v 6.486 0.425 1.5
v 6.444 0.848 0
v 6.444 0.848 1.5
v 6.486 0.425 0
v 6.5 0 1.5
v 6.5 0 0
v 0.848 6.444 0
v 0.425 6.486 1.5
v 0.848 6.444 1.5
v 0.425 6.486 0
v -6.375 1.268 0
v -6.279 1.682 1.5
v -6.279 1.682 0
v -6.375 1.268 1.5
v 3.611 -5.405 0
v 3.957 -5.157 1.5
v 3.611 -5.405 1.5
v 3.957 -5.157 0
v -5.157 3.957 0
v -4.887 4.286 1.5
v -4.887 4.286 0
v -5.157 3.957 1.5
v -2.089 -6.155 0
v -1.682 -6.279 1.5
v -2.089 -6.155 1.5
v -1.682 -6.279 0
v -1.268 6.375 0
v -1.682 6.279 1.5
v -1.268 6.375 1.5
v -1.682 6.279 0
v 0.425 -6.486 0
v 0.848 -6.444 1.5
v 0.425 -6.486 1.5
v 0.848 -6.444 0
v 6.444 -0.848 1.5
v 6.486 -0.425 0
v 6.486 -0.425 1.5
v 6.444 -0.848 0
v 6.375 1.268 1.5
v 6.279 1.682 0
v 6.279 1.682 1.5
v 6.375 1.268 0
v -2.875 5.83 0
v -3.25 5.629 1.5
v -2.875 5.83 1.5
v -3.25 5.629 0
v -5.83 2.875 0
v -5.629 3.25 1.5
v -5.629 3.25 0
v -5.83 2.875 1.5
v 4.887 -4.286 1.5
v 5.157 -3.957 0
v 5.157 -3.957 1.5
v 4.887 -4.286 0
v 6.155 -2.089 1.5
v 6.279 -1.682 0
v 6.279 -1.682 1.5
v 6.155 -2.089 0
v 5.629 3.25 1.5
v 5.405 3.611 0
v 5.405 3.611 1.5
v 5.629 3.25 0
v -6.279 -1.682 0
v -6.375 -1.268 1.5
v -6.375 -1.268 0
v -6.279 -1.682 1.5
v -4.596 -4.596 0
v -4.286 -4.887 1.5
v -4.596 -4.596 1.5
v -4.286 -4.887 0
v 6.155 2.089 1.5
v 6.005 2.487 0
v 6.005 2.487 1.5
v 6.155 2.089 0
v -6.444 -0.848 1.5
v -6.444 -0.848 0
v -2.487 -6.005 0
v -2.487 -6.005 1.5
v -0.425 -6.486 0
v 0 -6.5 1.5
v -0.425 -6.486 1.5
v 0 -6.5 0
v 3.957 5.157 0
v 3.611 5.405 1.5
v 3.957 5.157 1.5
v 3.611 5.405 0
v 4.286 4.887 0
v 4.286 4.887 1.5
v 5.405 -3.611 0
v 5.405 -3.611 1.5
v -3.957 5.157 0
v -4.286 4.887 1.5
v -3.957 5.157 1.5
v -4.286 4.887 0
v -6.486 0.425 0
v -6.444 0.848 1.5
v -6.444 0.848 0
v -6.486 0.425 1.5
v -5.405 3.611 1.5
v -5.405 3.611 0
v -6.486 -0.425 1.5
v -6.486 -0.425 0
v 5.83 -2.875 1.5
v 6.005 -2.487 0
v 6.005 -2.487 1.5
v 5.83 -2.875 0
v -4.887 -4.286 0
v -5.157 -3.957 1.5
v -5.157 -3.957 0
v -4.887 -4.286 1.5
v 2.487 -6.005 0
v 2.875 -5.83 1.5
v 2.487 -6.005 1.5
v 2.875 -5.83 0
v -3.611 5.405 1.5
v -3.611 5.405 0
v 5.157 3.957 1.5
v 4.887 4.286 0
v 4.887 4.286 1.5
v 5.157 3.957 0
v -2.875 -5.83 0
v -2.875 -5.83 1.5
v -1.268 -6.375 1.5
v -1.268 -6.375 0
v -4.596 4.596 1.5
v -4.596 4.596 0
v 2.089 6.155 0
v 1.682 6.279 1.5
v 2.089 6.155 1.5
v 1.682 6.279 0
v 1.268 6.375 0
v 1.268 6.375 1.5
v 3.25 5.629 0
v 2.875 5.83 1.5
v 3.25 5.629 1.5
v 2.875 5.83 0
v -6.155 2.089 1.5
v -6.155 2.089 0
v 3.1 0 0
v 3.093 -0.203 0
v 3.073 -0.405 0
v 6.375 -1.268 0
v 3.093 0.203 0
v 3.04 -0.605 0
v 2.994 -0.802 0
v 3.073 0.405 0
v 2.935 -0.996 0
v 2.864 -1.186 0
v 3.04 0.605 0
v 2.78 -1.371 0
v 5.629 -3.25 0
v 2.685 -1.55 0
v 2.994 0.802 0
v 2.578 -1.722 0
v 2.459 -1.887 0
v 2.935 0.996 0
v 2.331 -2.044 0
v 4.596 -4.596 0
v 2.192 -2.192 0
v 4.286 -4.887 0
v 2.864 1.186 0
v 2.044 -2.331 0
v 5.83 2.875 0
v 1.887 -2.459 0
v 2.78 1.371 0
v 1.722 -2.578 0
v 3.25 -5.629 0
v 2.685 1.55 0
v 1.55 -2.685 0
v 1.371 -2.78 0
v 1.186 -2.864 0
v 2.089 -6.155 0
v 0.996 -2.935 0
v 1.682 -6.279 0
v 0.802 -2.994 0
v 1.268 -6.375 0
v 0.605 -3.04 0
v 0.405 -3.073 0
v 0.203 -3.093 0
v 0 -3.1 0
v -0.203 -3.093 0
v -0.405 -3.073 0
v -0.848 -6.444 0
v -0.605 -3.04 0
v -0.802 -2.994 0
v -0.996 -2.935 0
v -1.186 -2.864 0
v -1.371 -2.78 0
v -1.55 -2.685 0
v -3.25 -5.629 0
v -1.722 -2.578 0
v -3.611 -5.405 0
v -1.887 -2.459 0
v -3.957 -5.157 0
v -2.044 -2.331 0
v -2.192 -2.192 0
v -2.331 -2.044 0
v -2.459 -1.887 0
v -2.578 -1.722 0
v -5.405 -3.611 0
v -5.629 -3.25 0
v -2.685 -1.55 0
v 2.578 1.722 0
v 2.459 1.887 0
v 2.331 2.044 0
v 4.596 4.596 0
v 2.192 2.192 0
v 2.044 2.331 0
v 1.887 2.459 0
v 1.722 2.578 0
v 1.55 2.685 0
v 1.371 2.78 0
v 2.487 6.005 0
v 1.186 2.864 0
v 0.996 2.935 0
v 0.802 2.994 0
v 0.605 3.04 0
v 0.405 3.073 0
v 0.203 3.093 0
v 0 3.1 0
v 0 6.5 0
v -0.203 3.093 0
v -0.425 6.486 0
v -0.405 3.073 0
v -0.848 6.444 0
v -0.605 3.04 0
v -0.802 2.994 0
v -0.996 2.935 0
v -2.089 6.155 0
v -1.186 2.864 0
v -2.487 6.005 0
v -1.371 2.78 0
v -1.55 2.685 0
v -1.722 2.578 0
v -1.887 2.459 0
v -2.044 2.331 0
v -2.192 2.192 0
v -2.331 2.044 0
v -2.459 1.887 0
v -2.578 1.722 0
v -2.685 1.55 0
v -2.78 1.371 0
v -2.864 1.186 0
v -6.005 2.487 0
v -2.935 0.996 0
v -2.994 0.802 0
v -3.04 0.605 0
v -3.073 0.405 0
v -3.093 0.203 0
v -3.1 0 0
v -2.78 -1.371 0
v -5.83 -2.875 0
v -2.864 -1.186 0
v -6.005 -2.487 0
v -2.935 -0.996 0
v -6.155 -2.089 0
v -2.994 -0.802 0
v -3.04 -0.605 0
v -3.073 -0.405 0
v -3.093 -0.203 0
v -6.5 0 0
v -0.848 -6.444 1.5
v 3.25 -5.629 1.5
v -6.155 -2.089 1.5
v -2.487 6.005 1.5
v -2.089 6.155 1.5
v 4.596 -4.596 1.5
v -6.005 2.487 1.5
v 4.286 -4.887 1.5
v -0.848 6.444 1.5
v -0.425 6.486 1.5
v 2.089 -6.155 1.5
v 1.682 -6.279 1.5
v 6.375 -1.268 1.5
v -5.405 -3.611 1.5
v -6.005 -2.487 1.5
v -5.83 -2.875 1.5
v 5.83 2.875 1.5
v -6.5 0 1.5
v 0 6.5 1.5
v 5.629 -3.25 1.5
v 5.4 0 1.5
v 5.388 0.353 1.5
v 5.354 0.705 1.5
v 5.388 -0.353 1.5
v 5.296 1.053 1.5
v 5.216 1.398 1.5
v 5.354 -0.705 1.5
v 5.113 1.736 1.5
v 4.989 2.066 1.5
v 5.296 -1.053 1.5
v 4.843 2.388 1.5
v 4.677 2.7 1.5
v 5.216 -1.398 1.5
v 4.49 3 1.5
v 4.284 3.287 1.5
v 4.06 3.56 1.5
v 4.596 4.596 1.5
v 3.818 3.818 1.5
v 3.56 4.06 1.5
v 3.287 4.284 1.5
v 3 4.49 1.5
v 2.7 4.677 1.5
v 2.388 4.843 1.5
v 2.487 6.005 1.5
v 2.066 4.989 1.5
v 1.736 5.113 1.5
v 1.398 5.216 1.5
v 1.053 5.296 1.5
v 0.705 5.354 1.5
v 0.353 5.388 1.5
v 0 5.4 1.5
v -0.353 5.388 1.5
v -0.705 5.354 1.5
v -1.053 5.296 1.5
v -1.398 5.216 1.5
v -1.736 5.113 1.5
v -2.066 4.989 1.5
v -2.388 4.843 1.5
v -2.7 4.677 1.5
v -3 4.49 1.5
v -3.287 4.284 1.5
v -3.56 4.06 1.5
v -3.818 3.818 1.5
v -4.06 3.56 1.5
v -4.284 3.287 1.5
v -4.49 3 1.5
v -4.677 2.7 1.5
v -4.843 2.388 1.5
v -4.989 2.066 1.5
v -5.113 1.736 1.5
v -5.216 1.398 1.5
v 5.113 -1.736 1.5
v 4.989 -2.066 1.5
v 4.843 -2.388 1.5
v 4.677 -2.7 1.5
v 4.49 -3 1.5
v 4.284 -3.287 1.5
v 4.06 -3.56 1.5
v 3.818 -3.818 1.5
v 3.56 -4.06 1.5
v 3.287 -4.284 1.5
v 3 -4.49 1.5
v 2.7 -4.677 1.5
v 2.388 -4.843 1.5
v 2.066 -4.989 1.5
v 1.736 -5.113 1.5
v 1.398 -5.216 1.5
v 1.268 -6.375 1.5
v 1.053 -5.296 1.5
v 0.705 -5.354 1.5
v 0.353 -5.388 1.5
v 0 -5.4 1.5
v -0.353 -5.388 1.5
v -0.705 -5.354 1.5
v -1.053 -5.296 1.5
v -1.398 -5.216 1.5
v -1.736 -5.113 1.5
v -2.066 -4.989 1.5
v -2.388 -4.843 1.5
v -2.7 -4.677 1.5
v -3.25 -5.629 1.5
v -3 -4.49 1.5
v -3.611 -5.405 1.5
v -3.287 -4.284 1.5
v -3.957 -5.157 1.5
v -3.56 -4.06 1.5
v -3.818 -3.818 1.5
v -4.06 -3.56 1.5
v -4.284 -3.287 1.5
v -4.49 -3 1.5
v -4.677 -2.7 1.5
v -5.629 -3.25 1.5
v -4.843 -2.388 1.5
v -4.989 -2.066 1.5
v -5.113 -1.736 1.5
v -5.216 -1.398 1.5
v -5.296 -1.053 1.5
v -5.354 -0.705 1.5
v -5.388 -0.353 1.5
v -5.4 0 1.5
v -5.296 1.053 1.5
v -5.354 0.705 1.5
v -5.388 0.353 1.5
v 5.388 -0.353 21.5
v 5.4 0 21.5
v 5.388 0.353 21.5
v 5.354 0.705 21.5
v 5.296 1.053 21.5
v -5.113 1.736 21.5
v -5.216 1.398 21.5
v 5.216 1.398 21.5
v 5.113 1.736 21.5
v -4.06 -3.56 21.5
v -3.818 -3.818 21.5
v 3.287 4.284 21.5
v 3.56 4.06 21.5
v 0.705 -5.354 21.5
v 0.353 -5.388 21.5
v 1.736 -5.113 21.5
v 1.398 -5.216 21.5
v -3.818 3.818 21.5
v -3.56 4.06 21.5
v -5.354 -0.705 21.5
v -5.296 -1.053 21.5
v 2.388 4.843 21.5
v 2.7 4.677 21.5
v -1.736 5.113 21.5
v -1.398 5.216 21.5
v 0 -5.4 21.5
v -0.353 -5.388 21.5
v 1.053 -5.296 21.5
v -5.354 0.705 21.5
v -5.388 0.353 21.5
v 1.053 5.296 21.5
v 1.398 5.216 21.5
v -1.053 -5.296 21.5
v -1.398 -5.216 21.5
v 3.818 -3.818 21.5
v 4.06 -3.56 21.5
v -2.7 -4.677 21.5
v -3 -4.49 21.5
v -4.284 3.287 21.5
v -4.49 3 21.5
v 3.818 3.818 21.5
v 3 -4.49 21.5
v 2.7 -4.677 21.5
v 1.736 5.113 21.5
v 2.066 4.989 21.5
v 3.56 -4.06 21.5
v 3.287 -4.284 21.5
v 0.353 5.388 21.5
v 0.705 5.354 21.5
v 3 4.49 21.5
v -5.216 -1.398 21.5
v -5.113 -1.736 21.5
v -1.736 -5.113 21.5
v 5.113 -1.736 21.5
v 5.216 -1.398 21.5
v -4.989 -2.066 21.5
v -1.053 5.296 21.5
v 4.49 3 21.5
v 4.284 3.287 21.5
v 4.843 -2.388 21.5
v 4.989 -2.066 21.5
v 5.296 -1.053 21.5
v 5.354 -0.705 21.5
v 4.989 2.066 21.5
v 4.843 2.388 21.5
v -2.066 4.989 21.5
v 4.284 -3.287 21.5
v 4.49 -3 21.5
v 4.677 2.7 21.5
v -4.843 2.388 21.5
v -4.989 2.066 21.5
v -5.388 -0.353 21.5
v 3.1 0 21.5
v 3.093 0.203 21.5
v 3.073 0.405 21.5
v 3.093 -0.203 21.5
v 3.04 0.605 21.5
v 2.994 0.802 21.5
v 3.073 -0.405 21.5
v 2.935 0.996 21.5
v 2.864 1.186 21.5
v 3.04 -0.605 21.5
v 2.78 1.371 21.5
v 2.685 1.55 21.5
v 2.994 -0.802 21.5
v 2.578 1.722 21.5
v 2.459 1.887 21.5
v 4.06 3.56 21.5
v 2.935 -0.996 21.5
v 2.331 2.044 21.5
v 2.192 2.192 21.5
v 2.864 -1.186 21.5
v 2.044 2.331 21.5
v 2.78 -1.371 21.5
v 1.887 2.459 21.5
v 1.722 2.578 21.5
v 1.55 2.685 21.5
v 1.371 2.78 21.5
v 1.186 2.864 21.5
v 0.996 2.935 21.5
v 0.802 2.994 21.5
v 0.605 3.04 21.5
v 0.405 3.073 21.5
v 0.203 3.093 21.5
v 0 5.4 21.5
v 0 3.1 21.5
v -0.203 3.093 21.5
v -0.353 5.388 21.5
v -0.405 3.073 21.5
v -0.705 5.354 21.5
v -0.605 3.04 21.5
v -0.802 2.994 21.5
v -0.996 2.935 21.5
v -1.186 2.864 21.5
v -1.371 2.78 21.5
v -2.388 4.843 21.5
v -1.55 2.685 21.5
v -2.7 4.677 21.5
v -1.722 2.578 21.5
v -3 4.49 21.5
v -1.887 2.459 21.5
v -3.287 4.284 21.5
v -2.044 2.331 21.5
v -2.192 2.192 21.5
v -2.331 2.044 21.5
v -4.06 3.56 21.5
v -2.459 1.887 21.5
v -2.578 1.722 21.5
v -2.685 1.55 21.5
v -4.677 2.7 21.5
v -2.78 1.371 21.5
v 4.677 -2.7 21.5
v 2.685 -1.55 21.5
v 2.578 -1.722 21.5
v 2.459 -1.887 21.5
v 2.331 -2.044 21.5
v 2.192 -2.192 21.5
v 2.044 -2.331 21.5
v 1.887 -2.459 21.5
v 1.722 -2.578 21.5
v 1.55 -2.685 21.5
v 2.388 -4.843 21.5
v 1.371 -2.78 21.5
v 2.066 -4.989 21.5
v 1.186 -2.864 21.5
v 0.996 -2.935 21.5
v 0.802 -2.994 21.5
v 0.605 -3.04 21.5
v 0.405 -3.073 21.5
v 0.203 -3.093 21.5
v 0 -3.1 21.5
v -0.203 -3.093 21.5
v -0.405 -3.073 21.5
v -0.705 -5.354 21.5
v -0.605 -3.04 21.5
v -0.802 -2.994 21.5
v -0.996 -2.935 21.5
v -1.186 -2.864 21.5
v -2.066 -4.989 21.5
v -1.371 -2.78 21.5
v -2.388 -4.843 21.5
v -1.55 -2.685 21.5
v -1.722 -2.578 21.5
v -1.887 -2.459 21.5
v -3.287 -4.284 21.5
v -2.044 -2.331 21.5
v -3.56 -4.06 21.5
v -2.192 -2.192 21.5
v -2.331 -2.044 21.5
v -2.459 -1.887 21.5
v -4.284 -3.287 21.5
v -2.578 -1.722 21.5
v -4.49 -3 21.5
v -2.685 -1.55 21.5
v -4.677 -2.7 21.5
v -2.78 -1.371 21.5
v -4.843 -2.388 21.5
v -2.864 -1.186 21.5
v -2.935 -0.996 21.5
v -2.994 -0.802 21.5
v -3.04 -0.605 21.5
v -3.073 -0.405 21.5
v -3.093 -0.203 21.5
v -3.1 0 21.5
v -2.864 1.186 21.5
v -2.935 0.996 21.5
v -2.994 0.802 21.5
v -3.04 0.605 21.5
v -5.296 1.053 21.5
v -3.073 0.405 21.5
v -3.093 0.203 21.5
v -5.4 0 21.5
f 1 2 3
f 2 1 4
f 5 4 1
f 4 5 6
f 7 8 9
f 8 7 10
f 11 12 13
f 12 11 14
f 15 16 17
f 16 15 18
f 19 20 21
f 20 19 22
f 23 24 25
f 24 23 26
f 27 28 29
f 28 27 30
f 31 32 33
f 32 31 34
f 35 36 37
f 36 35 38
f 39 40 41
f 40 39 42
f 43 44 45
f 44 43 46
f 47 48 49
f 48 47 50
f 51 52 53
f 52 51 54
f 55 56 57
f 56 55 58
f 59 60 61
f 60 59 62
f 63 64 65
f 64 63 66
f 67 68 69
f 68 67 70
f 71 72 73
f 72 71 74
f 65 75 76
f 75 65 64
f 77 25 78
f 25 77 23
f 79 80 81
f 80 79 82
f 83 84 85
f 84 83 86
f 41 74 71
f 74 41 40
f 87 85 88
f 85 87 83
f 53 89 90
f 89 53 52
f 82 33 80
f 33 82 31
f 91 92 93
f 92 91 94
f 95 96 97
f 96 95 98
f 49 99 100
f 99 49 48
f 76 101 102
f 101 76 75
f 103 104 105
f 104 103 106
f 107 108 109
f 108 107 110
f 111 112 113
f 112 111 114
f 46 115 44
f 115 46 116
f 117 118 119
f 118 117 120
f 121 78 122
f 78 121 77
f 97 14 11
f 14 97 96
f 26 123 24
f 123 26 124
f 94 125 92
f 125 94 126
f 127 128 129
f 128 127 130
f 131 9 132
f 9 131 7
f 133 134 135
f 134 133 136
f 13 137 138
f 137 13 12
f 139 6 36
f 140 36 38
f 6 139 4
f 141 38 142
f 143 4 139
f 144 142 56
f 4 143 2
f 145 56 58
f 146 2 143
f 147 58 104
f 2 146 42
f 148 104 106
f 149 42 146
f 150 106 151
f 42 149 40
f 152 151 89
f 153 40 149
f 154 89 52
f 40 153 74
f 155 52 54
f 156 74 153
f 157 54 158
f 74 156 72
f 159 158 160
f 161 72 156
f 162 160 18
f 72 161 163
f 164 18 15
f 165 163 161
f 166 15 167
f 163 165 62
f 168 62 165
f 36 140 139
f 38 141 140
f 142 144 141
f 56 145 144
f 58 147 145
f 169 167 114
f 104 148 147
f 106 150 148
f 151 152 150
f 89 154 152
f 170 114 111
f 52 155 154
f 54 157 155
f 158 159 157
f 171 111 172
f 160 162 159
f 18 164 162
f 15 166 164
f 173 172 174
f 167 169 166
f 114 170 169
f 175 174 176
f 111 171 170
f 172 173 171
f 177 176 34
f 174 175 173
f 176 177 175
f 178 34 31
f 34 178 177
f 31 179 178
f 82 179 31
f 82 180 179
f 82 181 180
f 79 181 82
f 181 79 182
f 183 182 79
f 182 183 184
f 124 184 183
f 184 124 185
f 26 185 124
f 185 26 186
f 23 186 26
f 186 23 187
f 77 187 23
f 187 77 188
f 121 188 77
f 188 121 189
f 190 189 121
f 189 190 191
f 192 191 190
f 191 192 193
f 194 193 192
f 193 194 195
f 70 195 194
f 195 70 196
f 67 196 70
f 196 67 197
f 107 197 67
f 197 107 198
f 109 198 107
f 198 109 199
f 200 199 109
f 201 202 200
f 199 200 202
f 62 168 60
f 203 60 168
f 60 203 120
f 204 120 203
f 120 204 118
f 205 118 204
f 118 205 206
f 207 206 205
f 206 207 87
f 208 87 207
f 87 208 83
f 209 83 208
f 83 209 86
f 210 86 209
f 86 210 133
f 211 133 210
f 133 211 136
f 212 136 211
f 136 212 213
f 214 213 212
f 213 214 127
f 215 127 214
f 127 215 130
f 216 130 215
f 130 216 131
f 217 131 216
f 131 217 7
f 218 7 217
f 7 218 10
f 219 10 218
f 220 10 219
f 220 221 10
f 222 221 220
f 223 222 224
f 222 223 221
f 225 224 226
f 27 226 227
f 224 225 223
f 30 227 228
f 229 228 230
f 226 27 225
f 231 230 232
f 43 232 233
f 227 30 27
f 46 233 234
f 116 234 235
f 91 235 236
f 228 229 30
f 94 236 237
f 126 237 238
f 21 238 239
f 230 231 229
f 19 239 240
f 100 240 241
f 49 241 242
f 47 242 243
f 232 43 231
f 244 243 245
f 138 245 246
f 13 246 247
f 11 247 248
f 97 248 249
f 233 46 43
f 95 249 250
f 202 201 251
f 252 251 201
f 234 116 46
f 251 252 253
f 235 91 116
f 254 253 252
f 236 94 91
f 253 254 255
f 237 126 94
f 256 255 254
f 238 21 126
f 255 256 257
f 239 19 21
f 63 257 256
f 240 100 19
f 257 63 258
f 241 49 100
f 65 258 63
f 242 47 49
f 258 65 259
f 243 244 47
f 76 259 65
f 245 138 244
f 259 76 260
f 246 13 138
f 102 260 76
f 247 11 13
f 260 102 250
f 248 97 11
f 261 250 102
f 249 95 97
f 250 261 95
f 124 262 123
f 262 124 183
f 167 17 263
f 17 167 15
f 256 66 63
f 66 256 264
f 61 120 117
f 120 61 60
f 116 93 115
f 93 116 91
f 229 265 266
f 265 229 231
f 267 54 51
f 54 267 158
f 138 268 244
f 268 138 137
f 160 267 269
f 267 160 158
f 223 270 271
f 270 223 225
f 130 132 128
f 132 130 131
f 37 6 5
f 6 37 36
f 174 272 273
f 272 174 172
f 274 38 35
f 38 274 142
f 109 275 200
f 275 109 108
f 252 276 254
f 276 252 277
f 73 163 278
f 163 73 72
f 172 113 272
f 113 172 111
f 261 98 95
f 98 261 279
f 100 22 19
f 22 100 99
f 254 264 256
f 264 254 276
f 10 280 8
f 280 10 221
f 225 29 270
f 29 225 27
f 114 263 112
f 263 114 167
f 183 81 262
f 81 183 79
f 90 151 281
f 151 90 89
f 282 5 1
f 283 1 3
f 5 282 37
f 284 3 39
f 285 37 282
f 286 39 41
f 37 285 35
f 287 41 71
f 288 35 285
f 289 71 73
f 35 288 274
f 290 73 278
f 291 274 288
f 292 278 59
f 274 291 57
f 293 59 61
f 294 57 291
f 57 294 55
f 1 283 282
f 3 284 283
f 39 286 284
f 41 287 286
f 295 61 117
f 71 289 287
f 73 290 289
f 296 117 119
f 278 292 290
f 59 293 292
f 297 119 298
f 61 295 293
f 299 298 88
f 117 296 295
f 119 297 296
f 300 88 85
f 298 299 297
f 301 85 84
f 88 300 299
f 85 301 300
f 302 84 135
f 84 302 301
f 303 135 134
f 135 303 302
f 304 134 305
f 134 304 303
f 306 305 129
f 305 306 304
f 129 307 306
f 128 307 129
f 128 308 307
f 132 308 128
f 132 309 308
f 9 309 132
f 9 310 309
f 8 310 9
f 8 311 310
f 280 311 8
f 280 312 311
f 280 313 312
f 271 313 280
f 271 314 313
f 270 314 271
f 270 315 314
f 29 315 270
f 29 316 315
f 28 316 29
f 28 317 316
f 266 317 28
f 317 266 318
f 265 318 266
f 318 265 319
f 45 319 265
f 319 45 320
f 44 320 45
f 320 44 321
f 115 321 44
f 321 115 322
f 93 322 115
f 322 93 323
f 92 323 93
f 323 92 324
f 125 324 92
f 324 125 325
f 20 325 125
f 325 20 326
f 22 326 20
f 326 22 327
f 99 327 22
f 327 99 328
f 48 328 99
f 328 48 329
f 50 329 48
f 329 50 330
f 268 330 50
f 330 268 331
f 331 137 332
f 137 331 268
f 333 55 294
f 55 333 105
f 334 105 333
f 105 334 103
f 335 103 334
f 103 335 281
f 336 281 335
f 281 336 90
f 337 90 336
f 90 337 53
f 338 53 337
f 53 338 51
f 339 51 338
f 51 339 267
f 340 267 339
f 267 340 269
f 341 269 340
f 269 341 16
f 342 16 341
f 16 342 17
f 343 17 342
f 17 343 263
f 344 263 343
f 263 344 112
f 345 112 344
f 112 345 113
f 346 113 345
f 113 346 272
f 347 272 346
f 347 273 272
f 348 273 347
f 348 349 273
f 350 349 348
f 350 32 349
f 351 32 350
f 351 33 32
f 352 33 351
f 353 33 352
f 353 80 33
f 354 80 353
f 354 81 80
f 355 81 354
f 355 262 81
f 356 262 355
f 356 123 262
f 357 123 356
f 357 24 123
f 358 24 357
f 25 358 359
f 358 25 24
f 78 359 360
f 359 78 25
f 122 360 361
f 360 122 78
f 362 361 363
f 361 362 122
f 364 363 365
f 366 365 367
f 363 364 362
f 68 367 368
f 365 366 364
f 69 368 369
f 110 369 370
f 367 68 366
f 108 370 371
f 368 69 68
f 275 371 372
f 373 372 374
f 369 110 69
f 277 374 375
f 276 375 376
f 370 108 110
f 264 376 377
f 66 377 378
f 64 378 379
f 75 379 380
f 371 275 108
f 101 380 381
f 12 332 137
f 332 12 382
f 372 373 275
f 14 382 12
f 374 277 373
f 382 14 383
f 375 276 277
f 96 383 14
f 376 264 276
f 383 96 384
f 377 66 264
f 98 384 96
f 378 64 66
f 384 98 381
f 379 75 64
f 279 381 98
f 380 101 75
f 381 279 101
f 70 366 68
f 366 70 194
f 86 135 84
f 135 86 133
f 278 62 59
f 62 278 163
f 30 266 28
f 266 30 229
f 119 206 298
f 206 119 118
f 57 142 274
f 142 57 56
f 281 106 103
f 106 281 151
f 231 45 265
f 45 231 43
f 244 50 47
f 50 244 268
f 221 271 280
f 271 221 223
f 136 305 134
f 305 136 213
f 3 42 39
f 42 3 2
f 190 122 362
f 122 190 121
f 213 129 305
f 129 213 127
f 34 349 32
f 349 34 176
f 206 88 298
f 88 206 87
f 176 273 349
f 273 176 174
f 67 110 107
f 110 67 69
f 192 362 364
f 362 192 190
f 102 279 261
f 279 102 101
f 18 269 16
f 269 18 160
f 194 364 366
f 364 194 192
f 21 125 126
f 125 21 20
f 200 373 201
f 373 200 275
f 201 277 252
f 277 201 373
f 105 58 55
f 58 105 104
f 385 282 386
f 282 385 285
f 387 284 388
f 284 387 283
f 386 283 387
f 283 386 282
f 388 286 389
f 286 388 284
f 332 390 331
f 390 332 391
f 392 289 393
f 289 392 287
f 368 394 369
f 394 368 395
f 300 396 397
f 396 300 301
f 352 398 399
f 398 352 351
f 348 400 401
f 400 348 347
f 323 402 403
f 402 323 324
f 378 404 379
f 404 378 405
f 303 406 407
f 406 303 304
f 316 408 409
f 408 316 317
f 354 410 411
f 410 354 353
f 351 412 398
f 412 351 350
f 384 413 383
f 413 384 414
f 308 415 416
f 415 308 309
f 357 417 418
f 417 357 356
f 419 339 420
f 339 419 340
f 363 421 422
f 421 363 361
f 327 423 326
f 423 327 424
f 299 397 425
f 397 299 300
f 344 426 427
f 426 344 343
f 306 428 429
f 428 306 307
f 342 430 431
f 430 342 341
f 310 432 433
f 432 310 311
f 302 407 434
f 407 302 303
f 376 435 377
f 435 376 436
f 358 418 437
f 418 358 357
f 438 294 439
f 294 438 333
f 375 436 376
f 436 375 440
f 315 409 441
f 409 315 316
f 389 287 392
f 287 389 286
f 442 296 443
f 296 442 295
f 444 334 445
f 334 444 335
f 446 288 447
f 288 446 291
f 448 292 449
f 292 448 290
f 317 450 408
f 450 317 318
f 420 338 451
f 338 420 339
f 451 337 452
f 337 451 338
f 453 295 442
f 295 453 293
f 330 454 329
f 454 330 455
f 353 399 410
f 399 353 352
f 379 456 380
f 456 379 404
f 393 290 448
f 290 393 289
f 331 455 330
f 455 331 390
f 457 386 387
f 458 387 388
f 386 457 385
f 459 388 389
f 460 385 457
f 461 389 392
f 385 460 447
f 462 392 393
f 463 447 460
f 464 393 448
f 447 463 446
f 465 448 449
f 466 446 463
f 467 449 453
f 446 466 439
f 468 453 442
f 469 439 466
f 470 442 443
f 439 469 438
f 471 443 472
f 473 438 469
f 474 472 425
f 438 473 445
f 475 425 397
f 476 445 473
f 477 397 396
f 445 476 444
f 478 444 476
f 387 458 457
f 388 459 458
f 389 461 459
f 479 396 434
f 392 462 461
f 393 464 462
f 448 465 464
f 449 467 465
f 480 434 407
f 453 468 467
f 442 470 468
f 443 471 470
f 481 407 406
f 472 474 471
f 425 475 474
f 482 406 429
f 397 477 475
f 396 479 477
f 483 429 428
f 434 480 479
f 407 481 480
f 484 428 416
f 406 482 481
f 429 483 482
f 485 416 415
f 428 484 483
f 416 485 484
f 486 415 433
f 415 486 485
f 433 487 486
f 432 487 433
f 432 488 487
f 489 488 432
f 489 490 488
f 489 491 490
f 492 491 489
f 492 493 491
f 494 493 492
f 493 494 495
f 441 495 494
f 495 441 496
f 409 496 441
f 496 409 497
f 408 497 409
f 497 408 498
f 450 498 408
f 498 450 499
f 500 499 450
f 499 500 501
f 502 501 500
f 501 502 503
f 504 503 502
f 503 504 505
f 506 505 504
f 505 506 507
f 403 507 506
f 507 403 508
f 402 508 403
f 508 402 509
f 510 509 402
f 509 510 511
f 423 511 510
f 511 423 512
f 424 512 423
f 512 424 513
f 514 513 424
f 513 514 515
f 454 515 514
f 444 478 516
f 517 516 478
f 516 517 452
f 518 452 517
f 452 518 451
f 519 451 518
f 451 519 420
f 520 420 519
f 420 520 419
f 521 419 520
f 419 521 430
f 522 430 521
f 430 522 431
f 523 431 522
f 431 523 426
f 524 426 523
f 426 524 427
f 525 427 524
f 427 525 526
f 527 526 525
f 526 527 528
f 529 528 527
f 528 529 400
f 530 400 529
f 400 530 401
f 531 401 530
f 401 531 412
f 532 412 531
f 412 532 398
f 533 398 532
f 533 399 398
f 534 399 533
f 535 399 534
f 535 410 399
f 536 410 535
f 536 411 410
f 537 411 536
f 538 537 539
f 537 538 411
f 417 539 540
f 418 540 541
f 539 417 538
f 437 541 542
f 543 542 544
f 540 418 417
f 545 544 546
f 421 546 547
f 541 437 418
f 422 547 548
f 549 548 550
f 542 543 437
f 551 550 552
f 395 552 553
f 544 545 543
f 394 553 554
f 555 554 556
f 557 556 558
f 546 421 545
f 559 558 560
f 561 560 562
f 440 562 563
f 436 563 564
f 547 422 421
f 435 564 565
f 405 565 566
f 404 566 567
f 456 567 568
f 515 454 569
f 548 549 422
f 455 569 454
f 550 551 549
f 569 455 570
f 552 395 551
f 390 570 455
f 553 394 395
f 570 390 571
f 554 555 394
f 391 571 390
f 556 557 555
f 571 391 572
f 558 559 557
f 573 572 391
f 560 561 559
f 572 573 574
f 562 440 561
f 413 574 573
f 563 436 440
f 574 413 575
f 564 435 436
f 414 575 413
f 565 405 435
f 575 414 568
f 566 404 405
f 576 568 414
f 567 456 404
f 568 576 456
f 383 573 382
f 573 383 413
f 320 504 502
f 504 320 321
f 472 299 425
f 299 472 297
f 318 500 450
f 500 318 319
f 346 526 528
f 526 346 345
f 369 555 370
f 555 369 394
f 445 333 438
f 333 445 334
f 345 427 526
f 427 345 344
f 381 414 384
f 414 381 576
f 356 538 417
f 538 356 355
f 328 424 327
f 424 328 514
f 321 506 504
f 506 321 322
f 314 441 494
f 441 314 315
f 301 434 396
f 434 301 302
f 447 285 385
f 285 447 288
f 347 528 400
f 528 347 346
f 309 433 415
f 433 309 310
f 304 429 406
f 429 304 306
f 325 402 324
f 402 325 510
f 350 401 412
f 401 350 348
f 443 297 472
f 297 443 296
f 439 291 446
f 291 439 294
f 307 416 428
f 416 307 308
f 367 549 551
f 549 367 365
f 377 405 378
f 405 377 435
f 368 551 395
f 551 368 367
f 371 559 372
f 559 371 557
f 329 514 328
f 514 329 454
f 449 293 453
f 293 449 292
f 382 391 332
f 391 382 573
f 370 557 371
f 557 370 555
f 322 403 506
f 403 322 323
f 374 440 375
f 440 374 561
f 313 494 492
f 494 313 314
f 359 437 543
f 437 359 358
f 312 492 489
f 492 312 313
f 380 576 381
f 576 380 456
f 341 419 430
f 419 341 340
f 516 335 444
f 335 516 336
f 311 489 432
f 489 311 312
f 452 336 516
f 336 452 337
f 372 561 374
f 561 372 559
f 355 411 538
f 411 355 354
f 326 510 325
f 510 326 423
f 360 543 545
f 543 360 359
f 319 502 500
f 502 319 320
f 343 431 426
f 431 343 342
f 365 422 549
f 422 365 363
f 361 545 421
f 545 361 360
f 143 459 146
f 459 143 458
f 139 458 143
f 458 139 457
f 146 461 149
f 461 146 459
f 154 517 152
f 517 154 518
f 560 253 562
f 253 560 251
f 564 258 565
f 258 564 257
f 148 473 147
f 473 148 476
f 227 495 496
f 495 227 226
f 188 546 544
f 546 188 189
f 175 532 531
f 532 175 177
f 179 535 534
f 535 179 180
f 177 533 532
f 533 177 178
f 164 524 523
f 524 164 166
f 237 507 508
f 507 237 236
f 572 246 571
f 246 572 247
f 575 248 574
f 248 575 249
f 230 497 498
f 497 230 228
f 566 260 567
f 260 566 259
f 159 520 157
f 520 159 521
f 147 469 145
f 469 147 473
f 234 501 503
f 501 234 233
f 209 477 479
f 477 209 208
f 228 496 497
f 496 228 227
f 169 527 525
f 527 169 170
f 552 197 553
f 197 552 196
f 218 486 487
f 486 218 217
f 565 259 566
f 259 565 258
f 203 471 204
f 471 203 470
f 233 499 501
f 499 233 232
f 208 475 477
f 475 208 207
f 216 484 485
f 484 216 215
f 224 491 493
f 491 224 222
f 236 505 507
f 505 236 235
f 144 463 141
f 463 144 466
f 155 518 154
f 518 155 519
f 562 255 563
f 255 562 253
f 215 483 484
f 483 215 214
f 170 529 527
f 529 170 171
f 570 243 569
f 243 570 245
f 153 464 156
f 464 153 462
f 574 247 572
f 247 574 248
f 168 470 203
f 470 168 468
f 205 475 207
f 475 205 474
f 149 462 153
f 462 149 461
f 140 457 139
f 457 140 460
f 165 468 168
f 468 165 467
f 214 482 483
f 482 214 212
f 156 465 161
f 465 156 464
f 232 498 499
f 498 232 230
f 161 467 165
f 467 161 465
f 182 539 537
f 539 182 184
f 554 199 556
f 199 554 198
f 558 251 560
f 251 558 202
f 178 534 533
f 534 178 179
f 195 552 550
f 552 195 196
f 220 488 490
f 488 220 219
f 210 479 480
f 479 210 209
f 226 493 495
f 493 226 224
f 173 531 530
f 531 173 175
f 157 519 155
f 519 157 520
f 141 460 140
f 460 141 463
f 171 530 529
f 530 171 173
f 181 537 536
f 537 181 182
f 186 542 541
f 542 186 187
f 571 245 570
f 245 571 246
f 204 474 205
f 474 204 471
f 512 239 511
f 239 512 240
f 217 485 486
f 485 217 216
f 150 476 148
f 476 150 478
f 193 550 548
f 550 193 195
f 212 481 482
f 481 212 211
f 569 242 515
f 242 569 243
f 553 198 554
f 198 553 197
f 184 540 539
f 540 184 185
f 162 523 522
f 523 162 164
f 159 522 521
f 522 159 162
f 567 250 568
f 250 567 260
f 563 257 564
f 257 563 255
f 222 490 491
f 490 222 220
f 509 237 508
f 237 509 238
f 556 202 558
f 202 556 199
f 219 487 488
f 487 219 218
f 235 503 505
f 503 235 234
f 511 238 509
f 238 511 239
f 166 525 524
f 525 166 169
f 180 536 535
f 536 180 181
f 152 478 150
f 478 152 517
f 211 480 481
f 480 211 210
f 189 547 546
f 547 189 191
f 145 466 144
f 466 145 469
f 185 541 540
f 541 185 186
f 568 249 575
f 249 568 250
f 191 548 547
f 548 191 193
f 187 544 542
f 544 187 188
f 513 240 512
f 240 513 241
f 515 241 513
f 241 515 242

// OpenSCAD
// PCR tube adapter sleeve: 0.2 mL tube in a 1.5 mL rack hole
// Print orientation: collar on bed (z = 0 to 1.5), sleeve body rises to z = 21.5

$fn = 96;

// --- Dimensions (mm) ---
collar_d      = 13;    // collar outer diameter
collar_h      = 1.5;   // collar thickness (z = 0 to 1.5)
sleeve_od     = 10.8;  // sleeve body outer diameter
sleeve_top_z  = 21.5;  // top of sleeve body (z)
bore_d        = 6.2;   // through-bore diameter
eps           = 0.5;   // cutter overshoot past faces

total_h = sleeve_top_z; // overall height (21.5)

difference() {
    union() {
        // Collar
        cylinder(d = collar_d, h = collar_h);
        // Sleeve body (overlaps slightly into collar for a clean union)
        translate([0, 0, collar_h - 0.01])
            cylinder(d = sleeve_od, h = total_h - collar_h + 0.01);
    }
    // Through-bore
    translate([0, 0, -eps])
        cylinder(d = bore_d, h = total_h + 2 * eps);
}
